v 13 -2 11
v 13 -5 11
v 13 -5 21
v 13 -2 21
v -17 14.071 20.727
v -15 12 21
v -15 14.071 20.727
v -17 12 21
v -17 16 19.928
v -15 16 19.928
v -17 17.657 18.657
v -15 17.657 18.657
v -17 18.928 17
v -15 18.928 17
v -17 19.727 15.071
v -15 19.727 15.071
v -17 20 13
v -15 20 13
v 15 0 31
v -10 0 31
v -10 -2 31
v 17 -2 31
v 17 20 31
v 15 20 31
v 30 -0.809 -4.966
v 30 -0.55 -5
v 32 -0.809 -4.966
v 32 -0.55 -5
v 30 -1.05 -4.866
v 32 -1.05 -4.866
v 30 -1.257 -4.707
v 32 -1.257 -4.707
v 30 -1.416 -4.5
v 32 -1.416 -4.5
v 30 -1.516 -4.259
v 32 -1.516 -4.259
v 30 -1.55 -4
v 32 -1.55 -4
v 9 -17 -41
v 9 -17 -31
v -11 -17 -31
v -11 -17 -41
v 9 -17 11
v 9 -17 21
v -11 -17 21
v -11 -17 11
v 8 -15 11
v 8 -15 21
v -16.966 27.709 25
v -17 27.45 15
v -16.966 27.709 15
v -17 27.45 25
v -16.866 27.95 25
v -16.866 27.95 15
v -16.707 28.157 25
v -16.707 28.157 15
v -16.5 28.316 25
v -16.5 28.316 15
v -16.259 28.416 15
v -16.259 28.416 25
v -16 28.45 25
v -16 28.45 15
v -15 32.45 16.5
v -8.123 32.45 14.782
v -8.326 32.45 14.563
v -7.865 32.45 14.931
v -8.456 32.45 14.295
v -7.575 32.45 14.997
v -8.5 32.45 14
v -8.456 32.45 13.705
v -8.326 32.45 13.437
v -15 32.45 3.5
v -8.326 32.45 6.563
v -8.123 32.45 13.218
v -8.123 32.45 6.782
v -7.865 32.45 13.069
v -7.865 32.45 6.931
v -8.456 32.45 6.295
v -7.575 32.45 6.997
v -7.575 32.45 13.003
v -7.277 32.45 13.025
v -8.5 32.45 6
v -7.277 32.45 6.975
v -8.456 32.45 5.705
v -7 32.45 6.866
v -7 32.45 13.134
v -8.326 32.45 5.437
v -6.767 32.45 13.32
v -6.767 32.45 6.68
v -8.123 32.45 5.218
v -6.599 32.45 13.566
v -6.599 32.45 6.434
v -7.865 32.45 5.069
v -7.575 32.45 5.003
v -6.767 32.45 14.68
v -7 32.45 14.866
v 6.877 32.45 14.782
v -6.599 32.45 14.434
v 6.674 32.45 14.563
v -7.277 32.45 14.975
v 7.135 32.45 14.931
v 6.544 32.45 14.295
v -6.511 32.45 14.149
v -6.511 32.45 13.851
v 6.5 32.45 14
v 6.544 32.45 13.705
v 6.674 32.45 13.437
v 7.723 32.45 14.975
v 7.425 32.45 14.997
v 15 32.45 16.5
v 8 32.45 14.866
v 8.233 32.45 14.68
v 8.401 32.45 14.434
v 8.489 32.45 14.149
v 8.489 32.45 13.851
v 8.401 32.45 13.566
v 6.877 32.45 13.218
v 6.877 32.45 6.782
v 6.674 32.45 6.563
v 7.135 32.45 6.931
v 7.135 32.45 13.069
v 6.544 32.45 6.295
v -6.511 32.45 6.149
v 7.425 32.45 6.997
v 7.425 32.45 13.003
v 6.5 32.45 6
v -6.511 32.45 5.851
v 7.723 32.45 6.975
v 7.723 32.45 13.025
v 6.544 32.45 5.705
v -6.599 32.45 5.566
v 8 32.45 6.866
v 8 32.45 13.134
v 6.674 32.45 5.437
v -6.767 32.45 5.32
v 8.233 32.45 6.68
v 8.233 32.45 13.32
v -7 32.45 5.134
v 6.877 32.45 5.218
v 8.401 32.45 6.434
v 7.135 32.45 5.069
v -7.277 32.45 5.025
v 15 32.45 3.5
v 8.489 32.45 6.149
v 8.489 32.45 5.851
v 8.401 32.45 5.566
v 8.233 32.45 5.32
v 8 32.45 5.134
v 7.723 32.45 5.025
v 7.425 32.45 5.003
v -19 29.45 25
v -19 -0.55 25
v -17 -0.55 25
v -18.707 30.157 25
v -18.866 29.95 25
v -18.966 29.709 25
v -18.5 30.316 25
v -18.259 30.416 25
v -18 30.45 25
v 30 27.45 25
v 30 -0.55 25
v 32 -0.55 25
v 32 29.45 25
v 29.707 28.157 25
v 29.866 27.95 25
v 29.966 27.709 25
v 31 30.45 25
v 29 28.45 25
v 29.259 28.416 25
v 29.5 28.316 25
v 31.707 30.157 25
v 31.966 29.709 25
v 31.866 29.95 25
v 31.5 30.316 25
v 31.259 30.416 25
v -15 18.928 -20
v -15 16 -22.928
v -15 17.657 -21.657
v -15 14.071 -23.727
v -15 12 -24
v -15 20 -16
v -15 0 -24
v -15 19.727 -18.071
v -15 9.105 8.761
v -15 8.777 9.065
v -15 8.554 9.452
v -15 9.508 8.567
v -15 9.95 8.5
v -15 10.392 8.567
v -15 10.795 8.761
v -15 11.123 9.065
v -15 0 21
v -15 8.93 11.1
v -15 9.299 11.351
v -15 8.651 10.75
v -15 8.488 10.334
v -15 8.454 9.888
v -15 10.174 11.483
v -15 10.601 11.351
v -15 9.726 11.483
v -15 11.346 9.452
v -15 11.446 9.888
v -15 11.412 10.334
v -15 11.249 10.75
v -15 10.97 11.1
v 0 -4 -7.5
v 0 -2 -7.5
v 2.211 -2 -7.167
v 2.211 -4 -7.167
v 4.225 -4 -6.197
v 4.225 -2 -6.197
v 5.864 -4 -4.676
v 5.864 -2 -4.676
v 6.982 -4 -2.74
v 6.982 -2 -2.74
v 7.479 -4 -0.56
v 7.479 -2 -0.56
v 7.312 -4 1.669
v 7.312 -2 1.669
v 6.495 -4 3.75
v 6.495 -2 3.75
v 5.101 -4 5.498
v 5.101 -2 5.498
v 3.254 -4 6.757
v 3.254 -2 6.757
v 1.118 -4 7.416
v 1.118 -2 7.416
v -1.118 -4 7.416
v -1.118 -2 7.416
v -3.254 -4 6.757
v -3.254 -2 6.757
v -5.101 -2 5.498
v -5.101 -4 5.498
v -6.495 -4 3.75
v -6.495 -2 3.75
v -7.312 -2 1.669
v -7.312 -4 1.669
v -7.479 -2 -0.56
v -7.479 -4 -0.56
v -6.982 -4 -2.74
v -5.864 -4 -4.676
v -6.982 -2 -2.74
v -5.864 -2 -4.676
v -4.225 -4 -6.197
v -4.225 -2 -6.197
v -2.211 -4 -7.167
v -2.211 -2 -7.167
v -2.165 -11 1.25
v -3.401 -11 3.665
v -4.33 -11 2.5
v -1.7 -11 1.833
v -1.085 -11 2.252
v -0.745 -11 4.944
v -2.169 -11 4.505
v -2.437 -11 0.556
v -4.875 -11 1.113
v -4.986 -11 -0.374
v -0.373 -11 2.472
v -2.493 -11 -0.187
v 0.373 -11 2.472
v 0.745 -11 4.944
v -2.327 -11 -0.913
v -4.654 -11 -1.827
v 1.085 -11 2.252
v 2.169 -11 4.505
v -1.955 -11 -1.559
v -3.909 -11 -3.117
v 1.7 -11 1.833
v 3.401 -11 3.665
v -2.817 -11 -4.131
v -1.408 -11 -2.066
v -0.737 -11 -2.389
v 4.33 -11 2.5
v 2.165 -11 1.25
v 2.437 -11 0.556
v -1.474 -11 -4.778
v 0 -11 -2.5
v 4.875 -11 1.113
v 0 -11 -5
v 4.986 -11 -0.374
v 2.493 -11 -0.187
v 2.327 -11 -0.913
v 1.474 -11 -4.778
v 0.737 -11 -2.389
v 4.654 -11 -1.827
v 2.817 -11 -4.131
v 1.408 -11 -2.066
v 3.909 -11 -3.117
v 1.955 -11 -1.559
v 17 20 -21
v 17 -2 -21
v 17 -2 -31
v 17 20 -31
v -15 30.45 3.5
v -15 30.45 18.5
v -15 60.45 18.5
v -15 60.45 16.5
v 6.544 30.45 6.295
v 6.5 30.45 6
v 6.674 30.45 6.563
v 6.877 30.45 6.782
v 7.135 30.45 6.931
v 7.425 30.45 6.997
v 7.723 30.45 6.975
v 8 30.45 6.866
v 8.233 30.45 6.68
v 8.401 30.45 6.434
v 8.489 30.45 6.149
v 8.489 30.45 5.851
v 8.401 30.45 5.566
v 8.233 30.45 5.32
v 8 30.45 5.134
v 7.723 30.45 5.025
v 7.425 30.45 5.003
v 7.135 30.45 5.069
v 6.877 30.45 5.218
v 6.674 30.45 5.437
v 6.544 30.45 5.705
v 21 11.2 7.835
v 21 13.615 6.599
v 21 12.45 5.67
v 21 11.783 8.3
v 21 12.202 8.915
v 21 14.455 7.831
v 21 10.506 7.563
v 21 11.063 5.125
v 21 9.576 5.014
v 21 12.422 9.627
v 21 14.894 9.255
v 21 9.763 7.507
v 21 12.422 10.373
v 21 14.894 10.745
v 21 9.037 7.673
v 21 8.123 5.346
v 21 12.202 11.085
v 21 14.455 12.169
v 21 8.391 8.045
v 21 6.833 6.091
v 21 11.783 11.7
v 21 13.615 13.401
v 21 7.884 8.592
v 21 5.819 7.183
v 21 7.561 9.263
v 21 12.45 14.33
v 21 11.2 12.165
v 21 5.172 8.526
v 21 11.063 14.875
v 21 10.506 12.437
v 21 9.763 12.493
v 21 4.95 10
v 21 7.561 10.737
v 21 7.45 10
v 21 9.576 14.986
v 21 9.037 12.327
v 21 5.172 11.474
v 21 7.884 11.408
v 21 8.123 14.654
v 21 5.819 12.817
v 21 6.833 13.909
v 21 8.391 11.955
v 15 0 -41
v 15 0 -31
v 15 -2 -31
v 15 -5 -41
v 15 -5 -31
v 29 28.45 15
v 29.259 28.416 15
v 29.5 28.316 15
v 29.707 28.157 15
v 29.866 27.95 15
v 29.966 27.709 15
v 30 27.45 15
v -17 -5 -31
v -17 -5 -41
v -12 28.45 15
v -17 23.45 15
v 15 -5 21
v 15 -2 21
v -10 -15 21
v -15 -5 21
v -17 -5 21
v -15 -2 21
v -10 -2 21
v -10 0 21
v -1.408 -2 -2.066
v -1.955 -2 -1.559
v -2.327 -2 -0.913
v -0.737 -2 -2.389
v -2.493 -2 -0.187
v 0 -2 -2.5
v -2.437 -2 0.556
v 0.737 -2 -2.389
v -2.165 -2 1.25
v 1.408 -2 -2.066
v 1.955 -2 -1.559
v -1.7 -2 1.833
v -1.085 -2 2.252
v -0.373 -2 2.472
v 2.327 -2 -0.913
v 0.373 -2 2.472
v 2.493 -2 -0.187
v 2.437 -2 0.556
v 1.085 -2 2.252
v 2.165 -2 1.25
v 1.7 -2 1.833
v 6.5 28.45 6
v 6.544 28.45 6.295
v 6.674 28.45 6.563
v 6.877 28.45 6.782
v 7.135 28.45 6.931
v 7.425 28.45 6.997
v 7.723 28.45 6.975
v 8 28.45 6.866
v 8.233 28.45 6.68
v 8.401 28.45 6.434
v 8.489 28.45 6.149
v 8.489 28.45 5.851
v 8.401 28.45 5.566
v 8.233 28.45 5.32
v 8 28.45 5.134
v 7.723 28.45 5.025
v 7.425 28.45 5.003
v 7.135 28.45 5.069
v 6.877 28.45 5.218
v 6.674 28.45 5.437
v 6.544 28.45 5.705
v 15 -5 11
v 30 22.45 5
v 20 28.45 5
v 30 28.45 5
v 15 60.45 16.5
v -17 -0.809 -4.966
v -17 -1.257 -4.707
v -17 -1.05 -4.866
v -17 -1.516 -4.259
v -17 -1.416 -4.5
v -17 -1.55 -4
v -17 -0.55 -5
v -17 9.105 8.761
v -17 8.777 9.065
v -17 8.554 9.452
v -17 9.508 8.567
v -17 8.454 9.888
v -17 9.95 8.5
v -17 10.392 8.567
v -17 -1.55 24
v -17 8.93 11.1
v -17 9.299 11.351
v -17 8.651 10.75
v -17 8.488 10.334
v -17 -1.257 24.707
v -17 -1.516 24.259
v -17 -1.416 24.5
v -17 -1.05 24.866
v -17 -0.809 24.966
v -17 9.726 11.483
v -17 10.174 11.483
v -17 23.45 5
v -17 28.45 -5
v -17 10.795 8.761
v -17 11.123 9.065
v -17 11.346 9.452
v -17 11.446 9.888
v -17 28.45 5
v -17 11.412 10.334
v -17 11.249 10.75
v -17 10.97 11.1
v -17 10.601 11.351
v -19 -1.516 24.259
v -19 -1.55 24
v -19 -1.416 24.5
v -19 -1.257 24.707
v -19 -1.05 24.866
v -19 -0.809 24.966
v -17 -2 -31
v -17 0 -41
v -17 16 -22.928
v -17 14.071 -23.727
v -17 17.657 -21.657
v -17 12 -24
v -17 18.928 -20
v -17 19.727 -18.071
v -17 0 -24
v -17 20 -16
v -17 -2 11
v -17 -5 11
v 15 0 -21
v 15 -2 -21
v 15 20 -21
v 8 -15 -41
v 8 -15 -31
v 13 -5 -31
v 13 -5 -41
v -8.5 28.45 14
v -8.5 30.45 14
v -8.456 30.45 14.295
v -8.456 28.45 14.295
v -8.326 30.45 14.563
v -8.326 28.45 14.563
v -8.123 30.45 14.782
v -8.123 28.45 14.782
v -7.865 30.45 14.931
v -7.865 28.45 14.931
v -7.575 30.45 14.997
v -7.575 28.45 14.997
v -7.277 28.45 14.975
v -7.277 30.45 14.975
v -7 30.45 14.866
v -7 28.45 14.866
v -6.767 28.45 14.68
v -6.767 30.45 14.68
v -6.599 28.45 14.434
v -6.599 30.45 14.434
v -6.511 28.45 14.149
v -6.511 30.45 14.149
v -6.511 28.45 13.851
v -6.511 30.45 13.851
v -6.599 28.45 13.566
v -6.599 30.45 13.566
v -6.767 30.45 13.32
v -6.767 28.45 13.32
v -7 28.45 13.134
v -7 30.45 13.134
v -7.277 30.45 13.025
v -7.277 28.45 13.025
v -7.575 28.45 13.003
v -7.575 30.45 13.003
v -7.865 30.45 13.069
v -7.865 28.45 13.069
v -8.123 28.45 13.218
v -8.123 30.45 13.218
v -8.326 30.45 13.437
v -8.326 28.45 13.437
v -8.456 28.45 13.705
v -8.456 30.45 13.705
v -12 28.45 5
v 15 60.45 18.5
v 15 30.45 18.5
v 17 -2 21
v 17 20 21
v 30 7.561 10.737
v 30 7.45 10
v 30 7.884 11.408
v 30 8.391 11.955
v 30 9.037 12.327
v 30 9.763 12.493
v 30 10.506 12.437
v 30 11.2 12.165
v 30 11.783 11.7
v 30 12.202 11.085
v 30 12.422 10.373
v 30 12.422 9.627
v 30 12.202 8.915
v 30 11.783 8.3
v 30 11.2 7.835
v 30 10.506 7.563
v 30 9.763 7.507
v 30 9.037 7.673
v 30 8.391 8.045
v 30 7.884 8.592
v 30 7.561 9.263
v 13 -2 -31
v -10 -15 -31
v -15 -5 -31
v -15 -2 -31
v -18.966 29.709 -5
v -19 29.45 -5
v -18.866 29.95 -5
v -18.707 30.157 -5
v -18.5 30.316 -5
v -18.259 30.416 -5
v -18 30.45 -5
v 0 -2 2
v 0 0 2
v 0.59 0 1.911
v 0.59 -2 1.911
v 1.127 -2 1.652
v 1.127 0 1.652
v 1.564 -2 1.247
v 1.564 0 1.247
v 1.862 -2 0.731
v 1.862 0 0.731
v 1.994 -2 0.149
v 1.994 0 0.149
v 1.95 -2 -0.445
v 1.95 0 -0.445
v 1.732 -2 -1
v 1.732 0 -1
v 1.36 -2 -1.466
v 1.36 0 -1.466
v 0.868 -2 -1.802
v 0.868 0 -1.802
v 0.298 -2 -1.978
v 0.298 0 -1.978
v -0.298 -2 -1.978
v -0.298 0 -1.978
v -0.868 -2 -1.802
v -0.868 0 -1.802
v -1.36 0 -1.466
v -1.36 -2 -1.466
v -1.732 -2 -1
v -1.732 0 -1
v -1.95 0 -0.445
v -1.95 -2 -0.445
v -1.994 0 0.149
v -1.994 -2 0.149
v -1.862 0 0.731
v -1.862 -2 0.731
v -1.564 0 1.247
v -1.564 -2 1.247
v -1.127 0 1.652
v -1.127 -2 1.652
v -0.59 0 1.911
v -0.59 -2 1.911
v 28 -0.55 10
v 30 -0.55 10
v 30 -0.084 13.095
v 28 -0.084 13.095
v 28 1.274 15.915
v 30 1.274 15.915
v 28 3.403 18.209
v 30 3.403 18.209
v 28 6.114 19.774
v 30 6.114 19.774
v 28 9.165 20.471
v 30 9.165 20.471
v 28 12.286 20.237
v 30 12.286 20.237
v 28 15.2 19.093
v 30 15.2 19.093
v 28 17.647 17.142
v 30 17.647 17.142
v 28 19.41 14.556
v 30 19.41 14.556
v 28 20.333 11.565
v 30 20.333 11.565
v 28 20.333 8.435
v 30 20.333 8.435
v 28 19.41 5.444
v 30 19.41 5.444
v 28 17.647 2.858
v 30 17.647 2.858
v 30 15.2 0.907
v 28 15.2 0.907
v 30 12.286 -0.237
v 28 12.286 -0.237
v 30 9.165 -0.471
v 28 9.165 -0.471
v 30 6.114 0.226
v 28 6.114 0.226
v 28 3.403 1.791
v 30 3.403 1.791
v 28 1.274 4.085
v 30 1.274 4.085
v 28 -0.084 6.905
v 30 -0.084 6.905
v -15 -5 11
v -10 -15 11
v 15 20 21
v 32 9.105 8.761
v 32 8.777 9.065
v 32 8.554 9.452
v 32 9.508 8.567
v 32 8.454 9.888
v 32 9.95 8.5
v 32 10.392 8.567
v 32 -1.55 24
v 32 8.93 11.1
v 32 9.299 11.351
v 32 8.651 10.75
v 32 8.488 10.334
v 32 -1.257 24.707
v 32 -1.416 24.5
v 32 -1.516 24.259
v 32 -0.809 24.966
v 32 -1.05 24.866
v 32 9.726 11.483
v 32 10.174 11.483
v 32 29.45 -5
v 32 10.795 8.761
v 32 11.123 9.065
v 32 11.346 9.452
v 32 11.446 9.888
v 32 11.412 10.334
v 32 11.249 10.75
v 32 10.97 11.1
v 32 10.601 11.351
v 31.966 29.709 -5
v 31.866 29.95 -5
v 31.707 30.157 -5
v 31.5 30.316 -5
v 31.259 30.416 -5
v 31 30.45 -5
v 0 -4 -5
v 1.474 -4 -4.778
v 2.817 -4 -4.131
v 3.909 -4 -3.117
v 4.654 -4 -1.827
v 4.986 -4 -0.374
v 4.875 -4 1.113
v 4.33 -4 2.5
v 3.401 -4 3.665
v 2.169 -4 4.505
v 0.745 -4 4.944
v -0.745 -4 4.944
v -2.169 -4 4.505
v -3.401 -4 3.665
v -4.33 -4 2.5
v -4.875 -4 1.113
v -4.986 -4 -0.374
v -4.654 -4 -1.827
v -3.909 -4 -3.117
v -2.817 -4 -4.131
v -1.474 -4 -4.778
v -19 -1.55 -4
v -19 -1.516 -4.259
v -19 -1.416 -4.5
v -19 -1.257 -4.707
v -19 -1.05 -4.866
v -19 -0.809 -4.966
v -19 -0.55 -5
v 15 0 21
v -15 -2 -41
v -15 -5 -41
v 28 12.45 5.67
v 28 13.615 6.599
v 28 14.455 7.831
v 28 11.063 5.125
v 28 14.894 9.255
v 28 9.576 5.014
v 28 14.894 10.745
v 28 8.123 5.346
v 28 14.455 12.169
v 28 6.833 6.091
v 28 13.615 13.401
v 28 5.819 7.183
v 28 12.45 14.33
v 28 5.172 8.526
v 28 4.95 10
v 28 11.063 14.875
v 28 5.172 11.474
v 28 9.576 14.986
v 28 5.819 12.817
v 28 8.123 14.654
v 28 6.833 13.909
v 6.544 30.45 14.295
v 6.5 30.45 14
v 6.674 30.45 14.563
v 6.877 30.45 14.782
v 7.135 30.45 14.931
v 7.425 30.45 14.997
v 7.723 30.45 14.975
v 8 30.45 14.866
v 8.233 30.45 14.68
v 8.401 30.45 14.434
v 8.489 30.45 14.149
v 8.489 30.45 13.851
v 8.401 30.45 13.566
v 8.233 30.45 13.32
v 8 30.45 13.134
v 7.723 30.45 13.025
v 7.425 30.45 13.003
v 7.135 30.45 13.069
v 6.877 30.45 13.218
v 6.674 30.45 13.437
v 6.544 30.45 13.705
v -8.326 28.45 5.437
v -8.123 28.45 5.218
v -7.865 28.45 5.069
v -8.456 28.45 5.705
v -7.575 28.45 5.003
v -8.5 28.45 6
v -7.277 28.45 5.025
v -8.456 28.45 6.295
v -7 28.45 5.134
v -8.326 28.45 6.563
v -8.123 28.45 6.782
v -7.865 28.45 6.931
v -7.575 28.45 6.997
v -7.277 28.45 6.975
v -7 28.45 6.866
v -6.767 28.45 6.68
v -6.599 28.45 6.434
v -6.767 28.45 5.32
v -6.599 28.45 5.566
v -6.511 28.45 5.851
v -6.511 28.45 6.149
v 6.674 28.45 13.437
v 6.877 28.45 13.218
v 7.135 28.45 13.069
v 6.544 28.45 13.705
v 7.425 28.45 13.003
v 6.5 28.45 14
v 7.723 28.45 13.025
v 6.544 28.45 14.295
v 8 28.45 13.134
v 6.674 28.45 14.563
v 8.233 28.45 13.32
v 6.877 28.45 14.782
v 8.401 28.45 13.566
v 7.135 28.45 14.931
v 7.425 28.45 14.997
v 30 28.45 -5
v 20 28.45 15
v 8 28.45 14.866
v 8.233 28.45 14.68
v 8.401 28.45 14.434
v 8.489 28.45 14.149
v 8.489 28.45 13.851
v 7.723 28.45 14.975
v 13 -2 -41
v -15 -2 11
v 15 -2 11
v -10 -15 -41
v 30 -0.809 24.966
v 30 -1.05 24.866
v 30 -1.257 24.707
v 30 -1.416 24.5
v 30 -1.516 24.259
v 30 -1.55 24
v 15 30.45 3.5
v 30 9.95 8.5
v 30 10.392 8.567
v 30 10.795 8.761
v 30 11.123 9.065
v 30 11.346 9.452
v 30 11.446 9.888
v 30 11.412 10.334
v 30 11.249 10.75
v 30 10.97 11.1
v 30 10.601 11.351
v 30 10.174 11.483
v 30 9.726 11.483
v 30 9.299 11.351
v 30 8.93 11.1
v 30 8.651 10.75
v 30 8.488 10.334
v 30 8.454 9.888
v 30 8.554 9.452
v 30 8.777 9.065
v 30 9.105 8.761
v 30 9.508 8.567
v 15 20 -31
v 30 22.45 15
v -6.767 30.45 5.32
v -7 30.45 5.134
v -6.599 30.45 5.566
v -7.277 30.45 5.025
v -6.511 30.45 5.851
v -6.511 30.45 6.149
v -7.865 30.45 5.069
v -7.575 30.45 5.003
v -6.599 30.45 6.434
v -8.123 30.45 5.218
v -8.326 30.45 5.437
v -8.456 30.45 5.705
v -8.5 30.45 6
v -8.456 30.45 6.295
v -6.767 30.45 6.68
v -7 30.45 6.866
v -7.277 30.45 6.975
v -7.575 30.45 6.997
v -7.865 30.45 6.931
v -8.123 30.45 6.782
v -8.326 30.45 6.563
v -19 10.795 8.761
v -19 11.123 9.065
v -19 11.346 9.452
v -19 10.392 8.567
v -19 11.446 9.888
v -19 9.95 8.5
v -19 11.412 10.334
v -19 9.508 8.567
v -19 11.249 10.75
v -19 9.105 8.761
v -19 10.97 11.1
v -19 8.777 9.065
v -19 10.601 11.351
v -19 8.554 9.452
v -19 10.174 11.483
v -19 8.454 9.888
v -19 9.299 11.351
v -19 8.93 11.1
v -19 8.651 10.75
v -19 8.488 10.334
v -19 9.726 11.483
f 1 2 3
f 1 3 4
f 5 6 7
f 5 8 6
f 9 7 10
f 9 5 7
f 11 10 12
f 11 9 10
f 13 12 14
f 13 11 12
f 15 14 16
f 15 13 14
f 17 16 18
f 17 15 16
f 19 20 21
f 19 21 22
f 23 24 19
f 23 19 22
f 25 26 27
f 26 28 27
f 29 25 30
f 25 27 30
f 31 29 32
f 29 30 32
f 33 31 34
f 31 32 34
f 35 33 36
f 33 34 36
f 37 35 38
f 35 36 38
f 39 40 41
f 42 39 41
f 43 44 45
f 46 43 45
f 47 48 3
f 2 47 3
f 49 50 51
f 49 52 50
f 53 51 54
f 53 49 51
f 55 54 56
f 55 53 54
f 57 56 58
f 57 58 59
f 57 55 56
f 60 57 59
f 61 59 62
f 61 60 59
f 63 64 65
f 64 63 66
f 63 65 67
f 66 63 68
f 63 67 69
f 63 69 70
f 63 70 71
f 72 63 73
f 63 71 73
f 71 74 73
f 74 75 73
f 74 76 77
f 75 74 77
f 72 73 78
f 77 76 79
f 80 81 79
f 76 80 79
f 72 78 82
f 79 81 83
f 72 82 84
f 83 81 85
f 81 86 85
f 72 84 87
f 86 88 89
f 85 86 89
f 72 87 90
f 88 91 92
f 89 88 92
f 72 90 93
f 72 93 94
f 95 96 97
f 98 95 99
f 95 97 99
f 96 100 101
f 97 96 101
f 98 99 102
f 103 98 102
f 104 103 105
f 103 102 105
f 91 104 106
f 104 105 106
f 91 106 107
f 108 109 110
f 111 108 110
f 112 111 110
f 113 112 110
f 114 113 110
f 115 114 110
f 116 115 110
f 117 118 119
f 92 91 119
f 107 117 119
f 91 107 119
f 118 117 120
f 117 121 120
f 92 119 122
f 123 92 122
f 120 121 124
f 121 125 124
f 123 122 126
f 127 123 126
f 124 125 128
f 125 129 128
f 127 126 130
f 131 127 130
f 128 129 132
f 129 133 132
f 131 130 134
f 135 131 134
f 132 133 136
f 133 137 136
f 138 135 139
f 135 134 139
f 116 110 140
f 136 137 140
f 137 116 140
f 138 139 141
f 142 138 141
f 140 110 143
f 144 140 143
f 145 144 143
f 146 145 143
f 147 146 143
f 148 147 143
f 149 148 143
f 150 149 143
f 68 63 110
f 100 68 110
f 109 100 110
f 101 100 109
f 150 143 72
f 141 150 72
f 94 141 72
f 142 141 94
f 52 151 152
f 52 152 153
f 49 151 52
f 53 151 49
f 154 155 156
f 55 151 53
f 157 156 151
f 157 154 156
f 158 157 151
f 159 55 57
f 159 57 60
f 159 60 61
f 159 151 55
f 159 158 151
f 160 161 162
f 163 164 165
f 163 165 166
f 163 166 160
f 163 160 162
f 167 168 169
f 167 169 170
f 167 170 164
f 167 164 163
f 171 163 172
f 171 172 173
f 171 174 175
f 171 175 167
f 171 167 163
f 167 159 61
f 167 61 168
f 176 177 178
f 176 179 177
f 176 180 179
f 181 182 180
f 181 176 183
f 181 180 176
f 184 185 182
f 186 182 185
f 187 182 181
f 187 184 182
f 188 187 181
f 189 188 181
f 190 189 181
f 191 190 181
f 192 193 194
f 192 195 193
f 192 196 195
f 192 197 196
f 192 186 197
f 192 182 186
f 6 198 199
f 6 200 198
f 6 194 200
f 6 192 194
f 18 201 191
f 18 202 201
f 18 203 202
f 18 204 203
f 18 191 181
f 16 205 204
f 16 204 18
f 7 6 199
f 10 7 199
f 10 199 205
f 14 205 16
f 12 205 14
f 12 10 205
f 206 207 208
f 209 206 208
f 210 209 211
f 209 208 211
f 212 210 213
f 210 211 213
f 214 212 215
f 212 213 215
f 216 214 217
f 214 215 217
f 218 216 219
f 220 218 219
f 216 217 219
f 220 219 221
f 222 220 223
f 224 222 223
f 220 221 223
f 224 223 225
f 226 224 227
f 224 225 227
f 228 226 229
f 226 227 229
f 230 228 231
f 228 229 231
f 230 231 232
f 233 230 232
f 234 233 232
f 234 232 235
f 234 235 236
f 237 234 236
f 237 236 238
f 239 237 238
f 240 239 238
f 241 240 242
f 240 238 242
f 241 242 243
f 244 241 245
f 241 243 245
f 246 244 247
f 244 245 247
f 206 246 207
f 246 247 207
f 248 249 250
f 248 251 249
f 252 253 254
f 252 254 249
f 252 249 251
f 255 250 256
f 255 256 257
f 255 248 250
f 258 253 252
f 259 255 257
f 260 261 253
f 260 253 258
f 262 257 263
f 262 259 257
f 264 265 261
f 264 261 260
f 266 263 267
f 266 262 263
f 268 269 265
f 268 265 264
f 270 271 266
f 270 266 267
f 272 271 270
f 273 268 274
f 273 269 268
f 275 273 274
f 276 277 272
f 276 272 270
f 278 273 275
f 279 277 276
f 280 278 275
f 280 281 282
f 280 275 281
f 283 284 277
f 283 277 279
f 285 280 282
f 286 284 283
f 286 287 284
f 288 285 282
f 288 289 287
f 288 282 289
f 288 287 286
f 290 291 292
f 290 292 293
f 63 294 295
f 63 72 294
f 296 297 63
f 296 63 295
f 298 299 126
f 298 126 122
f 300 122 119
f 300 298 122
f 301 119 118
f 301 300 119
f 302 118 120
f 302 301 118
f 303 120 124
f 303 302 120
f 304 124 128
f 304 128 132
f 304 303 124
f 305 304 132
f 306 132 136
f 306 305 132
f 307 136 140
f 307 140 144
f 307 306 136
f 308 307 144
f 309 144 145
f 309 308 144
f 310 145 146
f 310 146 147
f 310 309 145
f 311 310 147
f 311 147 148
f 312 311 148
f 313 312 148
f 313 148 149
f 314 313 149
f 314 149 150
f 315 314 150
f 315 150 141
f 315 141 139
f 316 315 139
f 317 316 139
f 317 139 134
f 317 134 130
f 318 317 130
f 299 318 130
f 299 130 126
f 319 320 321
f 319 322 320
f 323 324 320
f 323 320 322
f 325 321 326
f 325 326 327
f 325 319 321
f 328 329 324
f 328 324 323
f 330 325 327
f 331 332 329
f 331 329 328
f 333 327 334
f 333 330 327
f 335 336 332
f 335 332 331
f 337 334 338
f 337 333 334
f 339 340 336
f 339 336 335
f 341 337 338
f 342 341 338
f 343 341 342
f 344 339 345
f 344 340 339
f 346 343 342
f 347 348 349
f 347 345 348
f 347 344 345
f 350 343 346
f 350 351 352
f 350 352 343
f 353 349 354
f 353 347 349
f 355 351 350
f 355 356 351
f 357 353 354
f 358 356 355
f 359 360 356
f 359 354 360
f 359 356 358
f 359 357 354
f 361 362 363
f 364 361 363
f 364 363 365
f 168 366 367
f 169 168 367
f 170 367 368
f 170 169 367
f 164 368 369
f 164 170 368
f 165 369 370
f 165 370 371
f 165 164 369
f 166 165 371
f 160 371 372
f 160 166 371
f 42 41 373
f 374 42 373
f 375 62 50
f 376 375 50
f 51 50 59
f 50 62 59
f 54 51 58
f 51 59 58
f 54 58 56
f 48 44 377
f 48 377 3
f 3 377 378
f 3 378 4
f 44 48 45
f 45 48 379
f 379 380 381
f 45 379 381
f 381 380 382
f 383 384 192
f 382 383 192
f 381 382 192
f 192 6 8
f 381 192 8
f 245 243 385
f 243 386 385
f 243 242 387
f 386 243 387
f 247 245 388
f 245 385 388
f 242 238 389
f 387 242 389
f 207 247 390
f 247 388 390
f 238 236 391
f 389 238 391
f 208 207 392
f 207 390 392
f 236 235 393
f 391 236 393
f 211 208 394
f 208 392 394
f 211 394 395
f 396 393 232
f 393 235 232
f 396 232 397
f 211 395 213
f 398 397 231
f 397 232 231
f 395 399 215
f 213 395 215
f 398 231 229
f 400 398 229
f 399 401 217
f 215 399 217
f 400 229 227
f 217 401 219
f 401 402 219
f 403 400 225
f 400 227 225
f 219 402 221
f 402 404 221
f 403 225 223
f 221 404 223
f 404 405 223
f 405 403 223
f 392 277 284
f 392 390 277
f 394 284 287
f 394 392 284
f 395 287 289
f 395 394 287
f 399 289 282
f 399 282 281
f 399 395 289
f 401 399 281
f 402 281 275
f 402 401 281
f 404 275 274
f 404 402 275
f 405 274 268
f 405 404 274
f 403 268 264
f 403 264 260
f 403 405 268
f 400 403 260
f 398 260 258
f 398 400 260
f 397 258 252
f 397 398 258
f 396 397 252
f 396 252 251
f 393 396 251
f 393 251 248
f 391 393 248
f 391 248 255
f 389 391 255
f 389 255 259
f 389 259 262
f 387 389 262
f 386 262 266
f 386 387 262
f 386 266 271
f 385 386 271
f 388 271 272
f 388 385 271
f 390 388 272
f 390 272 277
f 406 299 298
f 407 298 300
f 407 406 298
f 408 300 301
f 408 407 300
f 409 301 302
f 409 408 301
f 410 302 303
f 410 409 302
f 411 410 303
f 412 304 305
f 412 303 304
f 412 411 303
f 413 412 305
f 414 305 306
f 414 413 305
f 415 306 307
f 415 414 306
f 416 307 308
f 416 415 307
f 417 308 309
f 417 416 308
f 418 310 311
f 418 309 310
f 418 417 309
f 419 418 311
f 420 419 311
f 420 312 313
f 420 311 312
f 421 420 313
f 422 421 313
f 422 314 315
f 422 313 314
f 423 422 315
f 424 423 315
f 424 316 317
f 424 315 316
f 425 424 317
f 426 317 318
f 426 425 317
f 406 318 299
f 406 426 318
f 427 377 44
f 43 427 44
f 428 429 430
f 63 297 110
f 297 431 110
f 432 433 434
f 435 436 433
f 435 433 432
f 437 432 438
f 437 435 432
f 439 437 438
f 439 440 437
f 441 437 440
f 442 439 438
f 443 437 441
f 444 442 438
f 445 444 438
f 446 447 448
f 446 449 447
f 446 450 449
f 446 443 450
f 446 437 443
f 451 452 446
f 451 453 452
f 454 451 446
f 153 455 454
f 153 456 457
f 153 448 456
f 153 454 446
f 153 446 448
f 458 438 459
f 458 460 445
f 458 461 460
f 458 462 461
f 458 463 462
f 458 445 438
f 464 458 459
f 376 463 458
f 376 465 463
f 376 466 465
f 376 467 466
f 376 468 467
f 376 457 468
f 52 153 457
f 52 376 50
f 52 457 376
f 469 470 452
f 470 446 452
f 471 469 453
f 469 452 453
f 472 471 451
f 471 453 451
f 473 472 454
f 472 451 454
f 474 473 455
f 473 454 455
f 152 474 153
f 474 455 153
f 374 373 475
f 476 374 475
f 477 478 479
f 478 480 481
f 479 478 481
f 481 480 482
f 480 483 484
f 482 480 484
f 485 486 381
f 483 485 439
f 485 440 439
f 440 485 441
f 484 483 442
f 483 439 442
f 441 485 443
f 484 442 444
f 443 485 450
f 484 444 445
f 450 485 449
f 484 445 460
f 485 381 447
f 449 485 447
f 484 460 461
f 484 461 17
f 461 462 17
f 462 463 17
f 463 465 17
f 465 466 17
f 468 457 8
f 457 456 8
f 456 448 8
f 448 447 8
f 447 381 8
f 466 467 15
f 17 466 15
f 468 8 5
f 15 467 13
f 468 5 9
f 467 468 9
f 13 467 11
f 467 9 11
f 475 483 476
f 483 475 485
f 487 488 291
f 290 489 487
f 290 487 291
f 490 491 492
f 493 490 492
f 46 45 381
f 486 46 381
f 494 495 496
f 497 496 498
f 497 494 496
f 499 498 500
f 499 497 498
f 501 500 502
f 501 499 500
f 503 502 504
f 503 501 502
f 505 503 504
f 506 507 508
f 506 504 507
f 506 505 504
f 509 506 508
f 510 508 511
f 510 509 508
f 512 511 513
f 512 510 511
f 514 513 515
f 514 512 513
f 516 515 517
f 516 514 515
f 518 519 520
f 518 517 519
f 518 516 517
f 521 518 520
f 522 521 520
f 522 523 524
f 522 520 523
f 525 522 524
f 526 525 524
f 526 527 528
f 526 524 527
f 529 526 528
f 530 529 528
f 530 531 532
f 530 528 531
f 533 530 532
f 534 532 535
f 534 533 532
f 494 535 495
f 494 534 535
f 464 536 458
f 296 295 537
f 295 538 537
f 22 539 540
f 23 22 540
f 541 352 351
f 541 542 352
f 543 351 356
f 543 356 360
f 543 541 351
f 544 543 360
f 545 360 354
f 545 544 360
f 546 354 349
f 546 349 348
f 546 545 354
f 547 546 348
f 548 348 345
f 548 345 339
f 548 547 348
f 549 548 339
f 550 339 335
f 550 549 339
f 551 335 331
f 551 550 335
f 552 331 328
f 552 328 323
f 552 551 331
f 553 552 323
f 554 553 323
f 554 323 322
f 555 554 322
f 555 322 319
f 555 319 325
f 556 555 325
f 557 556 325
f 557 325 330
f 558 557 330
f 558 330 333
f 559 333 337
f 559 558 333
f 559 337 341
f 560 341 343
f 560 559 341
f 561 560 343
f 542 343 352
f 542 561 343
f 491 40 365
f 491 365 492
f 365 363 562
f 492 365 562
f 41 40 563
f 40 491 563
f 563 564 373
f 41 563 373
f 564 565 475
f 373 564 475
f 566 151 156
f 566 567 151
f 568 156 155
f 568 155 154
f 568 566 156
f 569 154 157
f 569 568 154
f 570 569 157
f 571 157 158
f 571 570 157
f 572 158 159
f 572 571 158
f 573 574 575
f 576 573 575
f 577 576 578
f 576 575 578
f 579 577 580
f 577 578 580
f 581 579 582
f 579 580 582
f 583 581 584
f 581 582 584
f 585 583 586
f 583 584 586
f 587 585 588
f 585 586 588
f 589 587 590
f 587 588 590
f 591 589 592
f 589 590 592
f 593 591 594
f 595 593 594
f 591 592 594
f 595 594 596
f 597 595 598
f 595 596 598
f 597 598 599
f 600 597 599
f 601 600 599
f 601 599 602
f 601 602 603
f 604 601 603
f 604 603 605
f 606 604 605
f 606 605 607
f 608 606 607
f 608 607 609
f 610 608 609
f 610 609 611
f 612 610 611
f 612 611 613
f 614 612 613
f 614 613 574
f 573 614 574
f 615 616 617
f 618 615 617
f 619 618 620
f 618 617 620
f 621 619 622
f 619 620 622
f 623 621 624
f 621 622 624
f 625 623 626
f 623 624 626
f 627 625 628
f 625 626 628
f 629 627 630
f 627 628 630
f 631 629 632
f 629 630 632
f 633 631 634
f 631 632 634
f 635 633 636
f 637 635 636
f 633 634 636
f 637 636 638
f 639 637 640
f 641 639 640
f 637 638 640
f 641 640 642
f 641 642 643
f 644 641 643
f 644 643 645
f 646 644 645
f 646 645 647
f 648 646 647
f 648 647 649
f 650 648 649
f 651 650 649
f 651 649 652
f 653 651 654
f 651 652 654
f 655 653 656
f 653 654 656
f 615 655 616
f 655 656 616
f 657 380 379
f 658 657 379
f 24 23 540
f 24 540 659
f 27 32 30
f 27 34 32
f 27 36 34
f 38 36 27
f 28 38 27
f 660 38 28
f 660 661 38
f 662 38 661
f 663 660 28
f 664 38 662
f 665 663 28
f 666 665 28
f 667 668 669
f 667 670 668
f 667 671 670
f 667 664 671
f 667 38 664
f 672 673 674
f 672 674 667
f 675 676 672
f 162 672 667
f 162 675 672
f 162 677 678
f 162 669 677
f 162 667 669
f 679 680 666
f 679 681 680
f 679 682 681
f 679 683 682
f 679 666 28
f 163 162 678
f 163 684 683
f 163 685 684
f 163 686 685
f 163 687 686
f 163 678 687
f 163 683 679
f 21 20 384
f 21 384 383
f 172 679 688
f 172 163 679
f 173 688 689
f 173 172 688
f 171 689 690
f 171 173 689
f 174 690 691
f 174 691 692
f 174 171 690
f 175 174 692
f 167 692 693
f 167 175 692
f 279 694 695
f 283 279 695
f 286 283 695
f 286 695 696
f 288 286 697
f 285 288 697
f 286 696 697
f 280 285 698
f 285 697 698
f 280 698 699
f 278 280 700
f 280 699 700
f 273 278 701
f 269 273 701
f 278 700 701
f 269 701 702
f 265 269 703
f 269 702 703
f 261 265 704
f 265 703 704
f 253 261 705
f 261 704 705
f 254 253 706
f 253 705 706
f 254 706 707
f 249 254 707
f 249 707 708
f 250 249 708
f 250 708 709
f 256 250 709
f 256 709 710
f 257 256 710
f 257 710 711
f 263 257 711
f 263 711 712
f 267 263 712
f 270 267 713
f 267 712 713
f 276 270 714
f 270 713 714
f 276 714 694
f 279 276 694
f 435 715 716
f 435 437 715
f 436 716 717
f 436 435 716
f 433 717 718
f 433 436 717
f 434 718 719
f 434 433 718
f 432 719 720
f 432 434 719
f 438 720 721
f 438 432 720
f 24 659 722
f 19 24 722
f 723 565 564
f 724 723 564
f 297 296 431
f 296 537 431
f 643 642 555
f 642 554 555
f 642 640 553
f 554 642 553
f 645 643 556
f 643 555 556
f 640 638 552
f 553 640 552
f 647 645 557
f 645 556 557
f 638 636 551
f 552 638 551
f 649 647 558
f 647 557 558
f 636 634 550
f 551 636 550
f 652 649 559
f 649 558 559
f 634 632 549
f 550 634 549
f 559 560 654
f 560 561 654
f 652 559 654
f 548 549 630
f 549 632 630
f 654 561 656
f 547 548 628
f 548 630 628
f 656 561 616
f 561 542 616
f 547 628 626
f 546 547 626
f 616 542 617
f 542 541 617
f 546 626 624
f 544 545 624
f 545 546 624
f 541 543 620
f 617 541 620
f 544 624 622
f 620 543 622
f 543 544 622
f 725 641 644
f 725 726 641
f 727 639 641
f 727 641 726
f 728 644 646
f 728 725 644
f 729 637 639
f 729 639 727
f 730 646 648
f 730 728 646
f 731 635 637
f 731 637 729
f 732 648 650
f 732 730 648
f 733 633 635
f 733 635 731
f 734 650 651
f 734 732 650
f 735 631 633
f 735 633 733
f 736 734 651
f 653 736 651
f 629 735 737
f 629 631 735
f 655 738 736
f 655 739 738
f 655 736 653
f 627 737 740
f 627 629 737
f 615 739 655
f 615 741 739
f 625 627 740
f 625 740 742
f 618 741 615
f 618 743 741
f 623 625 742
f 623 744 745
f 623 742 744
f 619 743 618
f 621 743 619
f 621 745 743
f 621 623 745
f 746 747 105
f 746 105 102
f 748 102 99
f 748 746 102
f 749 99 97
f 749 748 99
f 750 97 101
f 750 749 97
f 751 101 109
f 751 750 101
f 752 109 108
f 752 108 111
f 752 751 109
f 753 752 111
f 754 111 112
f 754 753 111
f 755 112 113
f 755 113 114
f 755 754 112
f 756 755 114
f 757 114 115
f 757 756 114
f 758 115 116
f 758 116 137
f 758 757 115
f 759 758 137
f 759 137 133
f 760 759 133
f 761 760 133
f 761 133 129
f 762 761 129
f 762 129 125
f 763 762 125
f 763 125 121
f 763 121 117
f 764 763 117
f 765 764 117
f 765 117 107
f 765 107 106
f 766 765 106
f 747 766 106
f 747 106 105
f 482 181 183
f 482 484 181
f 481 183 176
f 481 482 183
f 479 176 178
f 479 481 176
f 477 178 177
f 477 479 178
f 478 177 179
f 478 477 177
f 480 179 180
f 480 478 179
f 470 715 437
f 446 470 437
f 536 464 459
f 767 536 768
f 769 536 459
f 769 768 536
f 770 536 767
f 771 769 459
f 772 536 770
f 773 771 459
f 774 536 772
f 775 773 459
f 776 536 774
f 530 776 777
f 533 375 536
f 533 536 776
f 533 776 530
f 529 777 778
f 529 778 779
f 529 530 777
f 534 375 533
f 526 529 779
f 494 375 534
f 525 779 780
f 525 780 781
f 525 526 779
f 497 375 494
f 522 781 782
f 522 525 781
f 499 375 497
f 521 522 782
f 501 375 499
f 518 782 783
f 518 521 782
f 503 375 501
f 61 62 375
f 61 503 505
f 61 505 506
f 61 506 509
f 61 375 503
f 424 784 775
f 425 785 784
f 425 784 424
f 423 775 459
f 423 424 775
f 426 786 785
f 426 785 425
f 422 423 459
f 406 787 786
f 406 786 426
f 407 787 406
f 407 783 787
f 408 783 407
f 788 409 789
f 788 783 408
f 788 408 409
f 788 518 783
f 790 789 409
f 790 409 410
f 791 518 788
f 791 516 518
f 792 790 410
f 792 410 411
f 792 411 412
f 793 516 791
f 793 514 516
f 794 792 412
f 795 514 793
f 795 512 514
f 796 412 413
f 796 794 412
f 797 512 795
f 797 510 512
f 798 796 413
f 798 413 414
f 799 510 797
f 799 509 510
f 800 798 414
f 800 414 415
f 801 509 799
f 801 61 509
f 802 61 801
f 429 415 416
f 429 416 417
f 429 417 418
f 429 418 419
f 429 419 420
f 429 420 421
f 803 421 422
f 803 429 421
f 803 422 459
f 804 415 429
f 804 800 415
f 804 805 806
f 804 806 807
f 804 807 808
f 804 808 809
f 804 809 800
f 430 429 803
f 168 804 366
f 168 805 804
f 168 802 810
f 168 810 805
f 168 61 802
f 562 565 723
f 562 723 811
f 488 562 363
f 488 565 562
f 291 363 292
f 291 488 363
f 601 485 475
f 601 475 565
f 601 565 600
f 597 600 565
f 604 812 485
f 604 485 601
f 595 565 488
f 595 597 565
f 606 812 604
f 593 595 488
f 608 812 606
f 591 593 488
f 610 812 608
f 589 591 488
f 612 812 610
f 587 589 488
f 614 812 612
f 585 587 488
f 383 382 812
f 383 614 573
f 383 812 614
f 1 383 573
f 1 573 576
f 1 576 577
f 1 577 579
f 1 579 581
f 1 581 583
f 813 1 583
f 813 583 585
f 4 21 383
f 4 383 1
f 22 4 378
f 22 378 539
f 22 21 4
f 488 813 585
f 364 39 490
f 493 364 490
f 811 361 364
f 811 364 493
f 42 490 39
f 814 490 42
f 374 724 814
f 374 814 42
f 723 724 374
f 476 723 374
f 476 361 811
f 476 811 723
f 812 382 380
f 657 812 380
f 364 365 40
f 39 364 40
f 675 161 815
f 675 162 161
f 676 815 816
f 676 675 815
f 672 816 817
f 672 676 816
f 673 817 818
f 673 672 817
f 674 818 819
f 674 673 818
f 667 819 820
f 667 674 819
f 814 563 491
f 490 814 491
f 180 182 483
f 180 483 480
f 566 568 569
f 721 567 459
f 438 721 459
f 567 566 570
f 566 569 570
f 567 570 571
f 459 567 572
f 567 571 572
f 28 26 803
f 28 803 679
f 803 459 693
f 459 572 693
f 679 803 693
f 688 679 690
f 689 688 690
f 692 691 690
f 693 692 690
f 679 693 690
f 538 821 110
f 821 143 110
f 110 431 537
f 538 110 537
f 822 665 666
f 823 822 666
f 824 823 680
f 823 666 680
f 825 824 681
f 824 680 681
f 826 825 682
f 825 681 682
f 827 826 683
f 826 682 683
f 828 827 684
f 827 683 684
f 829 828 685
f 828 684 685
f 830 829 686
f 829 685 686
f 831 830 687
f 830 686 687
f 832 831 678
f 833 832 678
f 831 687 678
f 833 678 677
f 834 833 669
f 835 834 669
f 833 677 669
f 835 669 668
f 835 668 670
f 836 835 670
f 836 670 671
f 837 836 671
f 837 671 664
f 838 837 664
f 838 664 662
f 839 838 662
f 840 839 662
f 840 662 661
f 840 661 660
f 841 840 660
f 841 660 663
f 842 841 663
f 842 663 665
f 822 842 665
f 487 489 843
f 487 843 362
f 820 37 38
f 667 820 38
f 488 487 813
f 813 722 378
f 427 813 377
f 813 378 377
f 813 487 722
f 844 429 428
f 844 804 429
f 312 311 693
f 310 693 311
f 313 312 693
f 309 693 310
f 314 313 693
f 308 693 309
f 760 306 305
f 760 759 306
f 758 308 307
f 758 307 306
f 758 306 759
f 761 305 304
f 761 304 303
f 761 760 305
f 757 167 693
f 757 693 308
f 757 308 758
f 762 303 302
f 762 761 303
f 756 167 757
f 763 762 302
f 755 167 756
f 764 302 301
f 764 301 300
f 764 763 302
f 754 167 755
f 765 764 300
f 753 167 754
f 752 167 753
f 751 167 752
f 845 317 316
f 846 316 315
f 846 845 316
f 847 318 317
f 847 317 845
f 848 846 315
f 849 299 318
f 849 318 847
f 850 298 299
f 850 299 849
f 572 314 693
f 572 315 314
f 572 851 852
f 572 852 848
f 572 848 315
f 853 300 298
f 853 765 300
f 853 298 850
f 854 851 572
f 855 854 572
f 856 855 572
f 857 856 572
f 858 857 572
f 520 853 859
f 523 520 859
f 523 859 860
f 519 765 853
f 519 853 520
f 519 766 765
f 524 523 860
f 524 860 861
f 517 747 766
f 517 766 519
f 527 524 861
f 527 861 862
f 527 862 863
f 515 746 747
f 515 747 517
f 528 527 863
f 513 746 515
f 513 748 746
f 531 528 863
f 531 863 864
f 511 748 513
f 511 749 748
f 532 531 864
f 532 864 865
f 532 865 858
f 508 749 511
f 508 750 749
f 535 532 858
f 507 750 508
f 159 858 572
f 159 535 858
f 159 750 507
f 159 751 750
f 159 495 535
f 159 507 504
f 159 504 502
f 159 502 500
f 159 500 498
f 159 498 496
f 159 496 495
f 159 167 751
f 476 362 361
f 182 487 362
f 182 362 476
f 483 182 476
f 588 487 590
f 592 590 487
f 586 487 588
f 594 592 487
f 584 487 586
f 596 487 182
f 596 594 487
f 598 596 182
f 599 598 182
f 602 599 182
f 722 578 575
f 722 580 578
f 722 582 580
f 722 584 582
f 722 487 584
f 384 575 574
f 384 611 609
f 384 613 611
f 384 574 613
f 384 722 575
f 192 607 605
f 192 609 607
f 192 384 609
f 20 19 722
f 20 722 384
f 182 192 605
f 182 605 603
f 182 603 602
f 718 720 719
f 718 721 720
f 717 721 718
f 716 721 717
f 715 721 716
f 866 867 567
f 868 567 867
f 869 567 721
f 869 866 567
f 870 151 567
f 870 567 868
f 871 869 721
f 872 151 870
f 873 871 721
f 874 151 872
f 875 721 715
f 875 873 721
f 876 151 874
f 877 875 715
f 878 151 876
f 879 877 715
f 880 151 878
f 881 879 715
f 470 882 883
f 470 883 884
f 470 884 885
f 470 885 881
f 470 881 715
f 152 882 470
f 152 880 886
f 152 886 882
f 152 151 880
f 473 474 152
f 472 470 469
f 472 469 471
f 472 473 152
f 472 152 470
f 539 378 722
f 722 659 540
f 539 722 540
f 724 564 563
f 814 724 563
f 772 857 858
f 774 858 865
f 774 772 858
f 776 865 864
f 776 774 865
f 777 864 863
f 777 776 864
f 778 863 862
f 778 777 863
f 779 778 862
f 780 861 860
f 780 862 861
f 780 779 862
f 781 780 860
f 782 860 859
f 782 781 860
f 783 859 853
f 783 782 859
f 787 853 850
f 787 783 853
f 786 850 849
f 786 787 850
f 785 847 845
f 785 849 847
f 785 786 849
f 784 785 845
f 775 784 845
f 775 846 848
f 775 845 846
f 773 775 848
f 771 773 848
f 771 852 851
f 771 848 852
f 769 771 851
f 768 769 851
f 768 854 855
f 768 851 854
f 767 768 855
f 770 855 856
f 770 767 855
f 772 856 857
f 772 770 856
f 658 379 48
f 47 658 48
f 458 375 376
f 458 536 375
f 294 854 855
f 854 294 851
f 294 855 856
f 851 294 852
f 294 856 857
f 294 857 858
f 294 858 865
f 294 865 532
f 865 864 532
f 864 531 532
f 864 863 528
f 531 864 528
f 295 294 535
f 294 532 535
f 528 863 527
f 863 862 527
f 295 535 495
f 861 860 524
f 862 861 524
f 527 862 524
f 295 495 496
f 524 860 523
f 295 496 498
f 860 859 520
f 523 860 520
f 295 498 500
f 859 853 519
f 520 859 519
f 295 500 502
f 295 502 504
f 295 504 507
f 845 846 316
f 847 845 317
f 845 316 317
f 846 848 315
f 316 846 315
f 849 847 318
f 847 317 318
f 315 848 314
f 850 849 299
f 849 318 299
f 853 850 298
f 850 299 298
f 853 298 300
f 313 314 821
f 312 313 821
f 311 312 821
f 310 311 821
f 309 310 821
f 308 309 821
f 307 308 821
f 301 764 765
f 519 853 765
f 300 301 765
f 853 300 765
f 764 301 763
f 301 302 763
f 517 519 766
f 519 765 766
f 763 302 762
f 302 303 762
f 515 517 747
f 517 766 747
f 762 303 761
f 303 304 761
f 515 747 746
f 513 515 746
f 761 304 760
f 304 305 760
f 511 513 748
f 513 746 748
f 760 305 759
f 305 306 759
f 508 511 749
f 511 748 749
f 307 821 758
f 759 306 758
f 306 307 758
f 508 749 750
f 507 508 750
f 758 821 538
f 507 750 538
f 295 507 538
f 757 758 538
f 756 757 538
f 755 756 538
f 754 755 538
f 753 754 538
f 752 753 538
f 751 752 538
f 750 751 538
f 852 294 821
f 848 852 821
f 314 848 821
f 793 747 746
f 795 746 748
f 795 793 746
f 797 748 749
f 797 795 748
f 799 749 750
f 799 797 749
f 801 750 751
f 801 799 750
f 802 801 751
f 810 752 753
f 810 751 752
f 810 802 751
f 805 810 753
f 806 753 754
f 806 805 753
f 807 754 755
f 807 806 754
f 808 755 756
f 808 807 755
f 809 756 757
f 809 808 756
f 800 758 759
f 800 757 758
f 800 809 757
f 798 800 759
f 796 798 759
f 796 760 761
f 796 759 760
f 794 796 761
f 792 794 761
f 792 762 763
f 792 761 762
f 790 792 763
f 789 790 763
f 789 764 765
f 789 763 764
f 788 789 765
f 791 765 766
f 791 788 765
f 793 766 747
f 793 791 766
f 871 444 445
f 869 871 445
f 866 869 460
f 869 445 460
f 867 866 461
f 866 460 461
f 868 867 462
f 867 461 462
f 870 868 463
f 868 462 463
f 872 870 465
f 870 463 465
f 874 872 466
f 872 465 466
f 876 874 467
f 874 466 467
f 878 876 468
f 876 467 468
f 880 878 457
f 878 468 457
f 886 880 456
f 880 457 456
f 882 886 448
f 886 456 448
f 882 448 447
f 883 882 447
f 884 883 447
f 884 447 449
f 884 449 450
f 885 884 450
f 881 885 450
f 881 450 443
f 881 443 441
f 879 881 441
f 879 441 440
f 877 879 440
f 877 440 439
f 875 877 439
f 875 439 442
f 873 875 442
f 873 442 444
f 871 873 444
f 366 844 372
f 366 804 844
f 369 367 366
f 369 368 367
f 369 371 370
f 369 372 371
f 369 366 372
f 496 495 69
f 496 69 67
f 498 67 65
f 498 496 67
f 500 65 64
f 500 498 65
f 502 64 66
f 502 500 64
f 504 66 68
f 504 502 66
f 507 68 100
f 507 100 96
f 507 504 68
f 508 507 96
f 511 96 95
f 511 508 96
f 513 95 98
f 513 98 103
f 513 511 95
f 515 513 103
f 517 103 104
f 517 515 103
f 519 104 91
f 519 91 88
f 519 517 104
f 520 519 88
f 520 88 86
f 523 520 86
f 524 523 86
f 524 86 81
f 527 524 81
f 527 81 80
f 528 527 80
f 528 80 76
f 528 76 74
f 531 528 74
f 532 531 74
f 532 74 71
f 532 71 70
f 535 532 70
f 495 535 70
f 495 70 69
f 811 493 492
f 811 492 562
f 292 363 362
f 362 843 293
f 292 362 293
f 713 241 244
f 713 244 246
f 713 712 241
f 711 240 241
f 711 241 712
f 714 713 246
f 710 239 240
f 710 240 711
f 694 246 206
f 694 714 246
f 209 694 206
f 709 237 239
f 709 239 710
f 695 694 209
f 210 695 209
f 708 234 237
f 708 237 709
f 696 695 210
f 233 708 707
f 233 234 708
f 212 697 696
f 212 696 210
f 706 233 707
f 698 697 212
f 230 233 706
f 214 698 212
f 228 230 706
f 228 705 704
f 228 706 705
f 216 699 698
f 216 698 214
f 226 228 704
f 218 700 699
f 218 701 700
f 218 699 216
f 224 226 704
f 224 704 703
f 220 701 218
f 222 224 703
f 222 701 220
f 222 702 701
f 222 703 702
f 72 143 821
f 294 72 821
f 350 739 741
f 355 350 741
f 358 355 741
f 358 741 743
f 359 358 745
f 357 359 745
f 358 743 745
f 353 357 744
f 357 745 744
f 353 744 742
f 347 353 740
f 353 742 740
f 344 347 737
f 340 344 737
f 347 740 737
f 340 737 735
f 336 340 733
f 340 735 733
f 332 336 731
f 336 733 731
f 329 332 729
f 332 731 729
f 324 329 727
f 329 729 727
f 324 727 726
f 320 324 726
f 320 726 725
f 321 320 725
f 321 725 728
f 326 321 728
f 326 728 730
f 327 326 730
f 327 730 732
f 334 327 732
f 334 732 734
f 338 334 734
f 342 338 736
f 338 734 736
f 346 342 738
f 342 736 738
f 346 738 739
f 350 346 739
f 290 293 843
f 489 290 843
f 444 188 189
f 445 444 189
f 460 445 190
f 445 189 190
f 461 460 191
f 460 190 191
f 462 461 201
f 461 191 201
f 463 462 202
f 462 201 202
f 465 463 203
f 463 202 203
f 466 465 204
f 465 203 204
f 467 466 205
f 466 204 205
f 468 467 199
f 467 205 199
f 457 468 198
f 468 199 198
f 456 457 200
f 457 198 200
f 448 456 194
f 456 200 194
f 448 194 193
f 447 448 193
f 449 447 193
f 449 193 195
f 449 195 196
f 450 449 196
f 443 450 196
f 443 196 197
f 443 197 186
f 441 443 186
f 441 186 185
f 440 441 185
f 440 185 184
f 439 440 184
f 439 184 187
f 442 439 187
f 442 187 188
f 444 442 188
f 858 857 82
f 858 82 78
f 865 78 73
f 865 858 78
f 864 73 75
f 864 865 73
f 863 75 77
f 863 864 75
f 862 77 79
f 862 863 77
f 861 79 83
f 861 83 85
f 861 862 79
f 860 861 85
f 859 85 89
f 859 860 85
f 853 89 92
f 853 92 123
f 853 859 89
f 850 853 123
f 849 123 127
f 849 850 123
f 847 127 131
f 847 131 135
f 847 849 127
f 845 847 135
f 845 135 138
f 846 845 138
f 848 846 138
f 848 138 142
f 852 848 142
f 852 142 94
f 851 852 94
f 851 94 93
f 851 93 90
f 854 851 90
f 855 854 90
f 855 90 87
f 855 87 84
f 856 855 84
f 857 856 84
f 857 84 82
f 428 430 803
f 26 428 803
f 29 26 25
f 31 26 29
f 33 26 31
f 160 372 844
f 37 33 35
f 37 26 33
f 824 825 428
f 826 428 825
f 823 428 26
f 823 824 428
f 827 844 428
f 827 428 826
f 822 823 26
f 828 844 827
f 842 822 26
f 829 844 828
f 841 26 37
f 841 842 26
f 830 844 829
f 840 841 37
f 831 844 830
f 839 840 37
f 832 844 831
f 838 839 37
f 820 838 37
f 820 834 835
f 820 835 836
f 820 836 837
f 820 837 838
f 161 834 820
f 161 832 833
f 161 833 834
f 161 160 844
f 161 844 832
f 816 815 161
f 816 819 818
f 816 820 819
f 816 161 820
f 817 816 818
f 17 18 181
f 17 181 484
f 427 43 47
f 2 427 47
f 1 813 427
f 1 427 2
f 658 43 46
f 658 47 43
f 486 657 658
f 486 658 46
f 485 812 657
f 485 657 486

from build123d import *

# Parameters (mm, degrees)
BOSS_EXTRUDE1_DEPTH  = 21
BOSS_EXTRUDE16_START = -21
BOSS_EXTRUDE16_DEPTH = 20
CUT_EXTRUDE4_REACH   = 56.599
SKETCH23_W           = 17
SKETCH23_H           = 20
FILLET1_R            = 8
BOSS_EXTRUDE5_DEPTH  = 10
BOSS_EXTRUDE14_START = -10
BOSS_EXTRUDE14_DEPTH = 10
BOSS_EXTRUDE15_START = -62
BOSS_EXTRUDE15_DEPTH = 10
CUT_EXTRUDE1_REACH   = 50.683
SKETCH5_R            = 2
BOSS_EXTRUDE2_START  = 10
BOSS_EXTRUDE2_DEPTH  = 15
BOSS_EXTRUDE17_DEPTH = 5
SKETCH7_R            = 1.5
CUT_EXTRUDE2_DEPTH   = 73.174805161
SKETCH8_R            = 7.5
SKETCH8_R_2          = 5
SKETCH8_R_3          = 2.5
BOSS_EXTRUDE3_DEPTH  = 2
SKETCH16_R           = 5
SKETCH16_R_2         = 2.5
BOSS_EXTRUDE7_DEPTH  = 7
SKETCH17_R           = 10.5
SKETCH17_R_2         = 2.5
BOSS_EXTRUDE8_DEPTH  = 2
SKETCH18_R           = 5
SKETCH18_R_2         = 2.5
BOSS_EXTRUDE9_DEPTH  = 7
BOSS_EXTRUDE6_DEPTH  = 15
CUT_EXTRUDE3_START   = -4
SKETCH19_R           = 1
CUT_EXTRUDE3_DEPTH   = 4
FILLET2_R            = 1


with BuildPart() as part:
    # Sketch4 → Boss-Extrude1 (new, symmetric)
    with BuildSketch(Plane.XY):
        Polygon((-17, 20), (-17, -2), (15, -2), (15, 0), (-15, 0), (-15, 20), align=None)
    extrude(amount=BOSS_EXTRUDE1_DEPTH, both=True)

    # Sketch4<2> → Boss-Extrude16 (add)
    with BuildSketch(Plane.XY.offset(BOSS_EXTRUDE16_START)):
        Polygon((-17, 20), (-17, -2), (15, -2), (15, 0), (-15, 0), (-15, 20), align=None)
    extrude(amount=-BOSS_EXTRUDE16_DEPTH)

    # Sketch23 → Cut-Extrude4 (cut, up to next)
    with BuildSketch(Plane(origin=(-15, 0, 0), x_dir=(0, 0, -1), z_dir=(1, 0, 0)), mode=Mode.PRIVATE) as cut_extrude4_sk1:
        with Locations((32.5, 10)):
            Rectangle(SKETCH23_W, SKETCH23_H)
    cut_extrude4_tool1 = extrude(cut_extrude4_sk1.sketch, amount=-CUT_EXTRUDE4_REACH, mode=Mode.PRIVATE) & part.part
    add(cut_extrude4_tool1.solids().sort_by_distance((-15, 10, -32.5))[0], mode=Mode.SUBTRACT)

    # Fillet1
    fillet1_edges = [part.edges().sort_by_distance(p)[0] for p in [
        (-16, 20, -24),
        (-16, 20, 21),
    ]]
    fillet(fillet1_edges, radius=FILLET1_R)

    # Sketch11 → Boss-Extrude5 (add)
    with BuildSketch(Plane.XY.offset(21)):
        Polygon((-10, 0), (-10, -2), (17, -2), (17, 20), (15, 20), (15, 0), align=None)
    boss_extrude5 = extrude(amount=BOSS_EXTRUDE5_DEPTH)

    # Mirror1: Boss-Extrude5 across plane
    add(boss_extrude5.mirror(Plane.XY))

    # Sketch21 → Boss-Extrude14 (add)
    with BuildSketch(Plane.XY.offset(31).offset(BOSS_EXTRUDE14_START)):
        Polygon((15, -2), (15, -5), (9, -17), (-11, -17), (-17, -5), (-17, -2), (-15, -2), (-15, -5), (-10, -15), (8, -15), (13, -5), (13, -2), align=None)
    extrude(amount=-BOSS_EXTRUDE14_DEPTH)

    # Sketch21<3> → Boss-Extrude15 (add)
    with BuildSketch(Plane.XY.offset(31).offset(BOSS_EXTRUDE15_START)):
        Polygon((15, -2), (15, -5), (9, -17), (-11, -17), (-17, -5), (-17, -2), (-15, -2), (-15, -5), (-10, -15), (8, -15), (13, -5), (13, -2), align=None)
    extrude(amount=-BOSS_EXTRUDE15_DEPTH)

    # Sketch5 → Cut-Extrude1 (cut, up to next)
    with BuildSketch(Plane(origin=(0, 0, 0), x_dir=(1, 0, 0), z_dir=(0, 1, 0)), mode=Mode.PRIVATE) as cut_extrude1_sk1:
        with Locations(Location((0, 0, 0), (0, 0, 270))):
            Circle(SKETCH5_R)
    cut_extrude1_tool1 = extrude(cut_extrude1_sk1.sketch, amount=-CUT_EXTRUDE1_REACH, mode=Mode.PRIVATE) & part.part
    add(cut_extrude1_tool1.solids().sort_by_distance((0, 0, 0))[0], mode=Mode.SUBTRACT)


with BuildPart() as body_2:
    # Sketch6 → Boss-Extrude2 (new, symmetric)
    with BuildSketch(Plane.XY.offset(BOSS_EXTRUDE2_START)):
        Polygon((-17, -1.55), (-17, 28.45), (30, 28.45), (30, -1.55), (32, -1.55), (32, 30.45), (-19, 30.45), (-19, -1.55), align=None)
    extrude(amount=BOSS_EXTRUDE2_DEPTH, both=True)

    # Sketch24 → Boss-Extrude17 (add, symmetric)
    with BuildSketch(Plane(origin=(0, 0, 10), x_dir=(-1, 0, 0), z_dir=(0, 0, -1))):
        Polygon((-20, 28.45), (-30, 22.45), (-30, 28.45), align=None)
        Polygon((12, 28.45), (17, 23.45), (17, 28.45), align=None)
    extrude(amount=BOSS_EXTRUDE17_DEPTH, both=True)


with BuildPart() as cut_extrude2_tool:
    # Sketch7 → Cut-Extrude2 (new, through all)
    with BuildSketch(Plane(origin=(32, 0, 0), x_dir=(0, 0, -1), z_dir=(1, 0, 0))):
        with Locations((-10, 9.95)):
            Circle(SKETCH7_R)
    extrude(amount=-CUT_EXTRUDE2_DEPTH)


with BuildPart() as part_1:
    add(part.part)

    # Cut-Extrude2: cut by cut_extrude2_tool
    add(cut_extrude2_tool.part, mode=Mode.SUBTRACT)


with BuildPart() as body_2_1:
    add(body_2.part)

    # Cut-Extrude2: cut by cut_extrude2_tool
    add(cut_extrude2_tool.part, mode=Mode.SUBTRACT)


with BuildPart() as body_3:
    # Sketch8 → Boss-Extrude3 (new body)
    # profile 1 of 2: a face of its own
    with BuildSketch(Plane.XZ.offset(2)):
        with Locations(Location((0, 0, 0), (0, 0, 270))):
            Circle(SKETCH8_R)
        Circle(SKETCH8_R_2, mode=Mode.SUBTRACT)
    # profile 2 of 2: a face of its own
    with BuildSketch(Plane.XZ.offset(2)):
        Circle(SKETCH8_R_2)
        with Locations(Location((0, 0, 0), (0, 0, 270))):
            Circle(SKETCH8_R_3, mode=Mode.SUBTRACT)
    extrude(amount=BOSS_EXTRUDE3_DEPTH)

    # Sketch16 → Boss-Extrude7 (add)
    with BuildSketch(Plane.XZ.offset(4)):
        with Locations(Location((0, 0, 0), (0, 0, 270))):
            Circle(SKETCH16_R)
        with Locations(Location((0, 0, 0), (0, 0, 270))):
            Circle(SKETCH16_R_2, mode=Mode.SUBTRACT)
    extrude(amount=BOSS_EXTRUDE7_DEPTH)


with BuildPart() as body_4:
    # Sketch17 → Boss-Extrude8 (new body)
    with BuildSketch(Plane(origin=(30, 0, 0), x_dir=(0, 0, -1), z_dir=(-1, 0, 0))):
        with Locations(Location((-10, -9.95, 0), (0, 0, 90))):
            Circle(SKETCH17_R)
        with Locations(Location((-10, -9.95, 0), (0, 0, 90))):
            Circle(SKETCH17_R_2, mode=Mode.SUBTRACT)
    extrude(amount=BOSS_EXTRUDE8_DEPTH)

    # Sketch18 → Boss-Extrude9 (add)
    with BuildSketch(Plane.ZY.offset(-28)):
        with Locations(Location((10, 9.95, 0), (0, 0, 270))):
            Circle(SKETCH18_R)
        with Locations(Location((10, 9.95, 0), (0, 0, 270))):
            Circle(SKETCH18_R_2, mode=Mode.SUBTRACT)
    extrude(amount=BOSS_EXTRUDE9_DEPTH)


with BuildPart() as body_5:
    # Sketch14 → Boss-Extrude6 (new, symmetric)
    with BuildSketch(Plane(origin=(0, 0, 0), x_dir=(0, 0, -1), z_dir=(1, 0, 0))):
        Polygon((-3.5, 30.45), (-18.5, 30.45), (-18.5, 60.45), (-16.5, 60.45), (-16.5, 32.45), (-3.5, 32.45), align=None)
    extrude(amount=BOSS_EXTRUDE6_DEPTH, both=True)


with BuildPart() as cut_extrude3_tool:
    # Sketch19 → Cut-Extrude3 (new body)
    with BuildSketch(Plane(origin=(0, 32.45, 0), x_dir=(1, 0, 0), z_dir=(0, 1, 0)).offset(CUT_EXTRUDE3_START)):
        with Locations(Location((-7.5, -6, 0), (0, 0, 180))):
            Circle(SKETCH19_R)
        with Locations(Location((7.5, -6, 0), (0, 0, 180))):
            Circle(SKETCH19_R)
        with Locations(Location((7.5, -14, 0), (0, 0, 180))):
            Circle(SKETCH19_R)
        with Locations(Location((-7.5, -14, 0), (0, 0, 180))):
            Circle(SKETCH19_R)
    extrude(amount=CUT_EXTRUDE3_DEPTH)


with BuildPart() as body_2_2:
    add(body_2_1.part)

    # Cut-Extrude3: cut by cut_extrude3_tool
    add(cut_extrude3_tool.part, mode=Mode.SUBTRACT)

    # Fillet2
    fillet2_edges = [body_2_2.edges().sort_by_distance(p)[0] for p in [
        (-18, -1.55, -5),
        (-19, 30.45, 10),
        (32, 30.45, 10),
        (30, 28.45, 20),
        (-17, 28.45, 20),
        (31, -1.55, 25),
        (-18, -1.55, 25),
        (31, -1.55, -5),
    ]]
    fillet(fillet2_edges, radius=FILLET2_R)


with BuildPart() as body_5_1:
    add(body_5.part)

    # Cut-Extrude3: cut by cut_extrude3_tool
    add(cut_extrude3_tool.part, mode=Mode.SUBTRACT)


solid = Compound([part_1.part, body_3.part, body_4.part, body_2_2.part, body_5_1.part])
